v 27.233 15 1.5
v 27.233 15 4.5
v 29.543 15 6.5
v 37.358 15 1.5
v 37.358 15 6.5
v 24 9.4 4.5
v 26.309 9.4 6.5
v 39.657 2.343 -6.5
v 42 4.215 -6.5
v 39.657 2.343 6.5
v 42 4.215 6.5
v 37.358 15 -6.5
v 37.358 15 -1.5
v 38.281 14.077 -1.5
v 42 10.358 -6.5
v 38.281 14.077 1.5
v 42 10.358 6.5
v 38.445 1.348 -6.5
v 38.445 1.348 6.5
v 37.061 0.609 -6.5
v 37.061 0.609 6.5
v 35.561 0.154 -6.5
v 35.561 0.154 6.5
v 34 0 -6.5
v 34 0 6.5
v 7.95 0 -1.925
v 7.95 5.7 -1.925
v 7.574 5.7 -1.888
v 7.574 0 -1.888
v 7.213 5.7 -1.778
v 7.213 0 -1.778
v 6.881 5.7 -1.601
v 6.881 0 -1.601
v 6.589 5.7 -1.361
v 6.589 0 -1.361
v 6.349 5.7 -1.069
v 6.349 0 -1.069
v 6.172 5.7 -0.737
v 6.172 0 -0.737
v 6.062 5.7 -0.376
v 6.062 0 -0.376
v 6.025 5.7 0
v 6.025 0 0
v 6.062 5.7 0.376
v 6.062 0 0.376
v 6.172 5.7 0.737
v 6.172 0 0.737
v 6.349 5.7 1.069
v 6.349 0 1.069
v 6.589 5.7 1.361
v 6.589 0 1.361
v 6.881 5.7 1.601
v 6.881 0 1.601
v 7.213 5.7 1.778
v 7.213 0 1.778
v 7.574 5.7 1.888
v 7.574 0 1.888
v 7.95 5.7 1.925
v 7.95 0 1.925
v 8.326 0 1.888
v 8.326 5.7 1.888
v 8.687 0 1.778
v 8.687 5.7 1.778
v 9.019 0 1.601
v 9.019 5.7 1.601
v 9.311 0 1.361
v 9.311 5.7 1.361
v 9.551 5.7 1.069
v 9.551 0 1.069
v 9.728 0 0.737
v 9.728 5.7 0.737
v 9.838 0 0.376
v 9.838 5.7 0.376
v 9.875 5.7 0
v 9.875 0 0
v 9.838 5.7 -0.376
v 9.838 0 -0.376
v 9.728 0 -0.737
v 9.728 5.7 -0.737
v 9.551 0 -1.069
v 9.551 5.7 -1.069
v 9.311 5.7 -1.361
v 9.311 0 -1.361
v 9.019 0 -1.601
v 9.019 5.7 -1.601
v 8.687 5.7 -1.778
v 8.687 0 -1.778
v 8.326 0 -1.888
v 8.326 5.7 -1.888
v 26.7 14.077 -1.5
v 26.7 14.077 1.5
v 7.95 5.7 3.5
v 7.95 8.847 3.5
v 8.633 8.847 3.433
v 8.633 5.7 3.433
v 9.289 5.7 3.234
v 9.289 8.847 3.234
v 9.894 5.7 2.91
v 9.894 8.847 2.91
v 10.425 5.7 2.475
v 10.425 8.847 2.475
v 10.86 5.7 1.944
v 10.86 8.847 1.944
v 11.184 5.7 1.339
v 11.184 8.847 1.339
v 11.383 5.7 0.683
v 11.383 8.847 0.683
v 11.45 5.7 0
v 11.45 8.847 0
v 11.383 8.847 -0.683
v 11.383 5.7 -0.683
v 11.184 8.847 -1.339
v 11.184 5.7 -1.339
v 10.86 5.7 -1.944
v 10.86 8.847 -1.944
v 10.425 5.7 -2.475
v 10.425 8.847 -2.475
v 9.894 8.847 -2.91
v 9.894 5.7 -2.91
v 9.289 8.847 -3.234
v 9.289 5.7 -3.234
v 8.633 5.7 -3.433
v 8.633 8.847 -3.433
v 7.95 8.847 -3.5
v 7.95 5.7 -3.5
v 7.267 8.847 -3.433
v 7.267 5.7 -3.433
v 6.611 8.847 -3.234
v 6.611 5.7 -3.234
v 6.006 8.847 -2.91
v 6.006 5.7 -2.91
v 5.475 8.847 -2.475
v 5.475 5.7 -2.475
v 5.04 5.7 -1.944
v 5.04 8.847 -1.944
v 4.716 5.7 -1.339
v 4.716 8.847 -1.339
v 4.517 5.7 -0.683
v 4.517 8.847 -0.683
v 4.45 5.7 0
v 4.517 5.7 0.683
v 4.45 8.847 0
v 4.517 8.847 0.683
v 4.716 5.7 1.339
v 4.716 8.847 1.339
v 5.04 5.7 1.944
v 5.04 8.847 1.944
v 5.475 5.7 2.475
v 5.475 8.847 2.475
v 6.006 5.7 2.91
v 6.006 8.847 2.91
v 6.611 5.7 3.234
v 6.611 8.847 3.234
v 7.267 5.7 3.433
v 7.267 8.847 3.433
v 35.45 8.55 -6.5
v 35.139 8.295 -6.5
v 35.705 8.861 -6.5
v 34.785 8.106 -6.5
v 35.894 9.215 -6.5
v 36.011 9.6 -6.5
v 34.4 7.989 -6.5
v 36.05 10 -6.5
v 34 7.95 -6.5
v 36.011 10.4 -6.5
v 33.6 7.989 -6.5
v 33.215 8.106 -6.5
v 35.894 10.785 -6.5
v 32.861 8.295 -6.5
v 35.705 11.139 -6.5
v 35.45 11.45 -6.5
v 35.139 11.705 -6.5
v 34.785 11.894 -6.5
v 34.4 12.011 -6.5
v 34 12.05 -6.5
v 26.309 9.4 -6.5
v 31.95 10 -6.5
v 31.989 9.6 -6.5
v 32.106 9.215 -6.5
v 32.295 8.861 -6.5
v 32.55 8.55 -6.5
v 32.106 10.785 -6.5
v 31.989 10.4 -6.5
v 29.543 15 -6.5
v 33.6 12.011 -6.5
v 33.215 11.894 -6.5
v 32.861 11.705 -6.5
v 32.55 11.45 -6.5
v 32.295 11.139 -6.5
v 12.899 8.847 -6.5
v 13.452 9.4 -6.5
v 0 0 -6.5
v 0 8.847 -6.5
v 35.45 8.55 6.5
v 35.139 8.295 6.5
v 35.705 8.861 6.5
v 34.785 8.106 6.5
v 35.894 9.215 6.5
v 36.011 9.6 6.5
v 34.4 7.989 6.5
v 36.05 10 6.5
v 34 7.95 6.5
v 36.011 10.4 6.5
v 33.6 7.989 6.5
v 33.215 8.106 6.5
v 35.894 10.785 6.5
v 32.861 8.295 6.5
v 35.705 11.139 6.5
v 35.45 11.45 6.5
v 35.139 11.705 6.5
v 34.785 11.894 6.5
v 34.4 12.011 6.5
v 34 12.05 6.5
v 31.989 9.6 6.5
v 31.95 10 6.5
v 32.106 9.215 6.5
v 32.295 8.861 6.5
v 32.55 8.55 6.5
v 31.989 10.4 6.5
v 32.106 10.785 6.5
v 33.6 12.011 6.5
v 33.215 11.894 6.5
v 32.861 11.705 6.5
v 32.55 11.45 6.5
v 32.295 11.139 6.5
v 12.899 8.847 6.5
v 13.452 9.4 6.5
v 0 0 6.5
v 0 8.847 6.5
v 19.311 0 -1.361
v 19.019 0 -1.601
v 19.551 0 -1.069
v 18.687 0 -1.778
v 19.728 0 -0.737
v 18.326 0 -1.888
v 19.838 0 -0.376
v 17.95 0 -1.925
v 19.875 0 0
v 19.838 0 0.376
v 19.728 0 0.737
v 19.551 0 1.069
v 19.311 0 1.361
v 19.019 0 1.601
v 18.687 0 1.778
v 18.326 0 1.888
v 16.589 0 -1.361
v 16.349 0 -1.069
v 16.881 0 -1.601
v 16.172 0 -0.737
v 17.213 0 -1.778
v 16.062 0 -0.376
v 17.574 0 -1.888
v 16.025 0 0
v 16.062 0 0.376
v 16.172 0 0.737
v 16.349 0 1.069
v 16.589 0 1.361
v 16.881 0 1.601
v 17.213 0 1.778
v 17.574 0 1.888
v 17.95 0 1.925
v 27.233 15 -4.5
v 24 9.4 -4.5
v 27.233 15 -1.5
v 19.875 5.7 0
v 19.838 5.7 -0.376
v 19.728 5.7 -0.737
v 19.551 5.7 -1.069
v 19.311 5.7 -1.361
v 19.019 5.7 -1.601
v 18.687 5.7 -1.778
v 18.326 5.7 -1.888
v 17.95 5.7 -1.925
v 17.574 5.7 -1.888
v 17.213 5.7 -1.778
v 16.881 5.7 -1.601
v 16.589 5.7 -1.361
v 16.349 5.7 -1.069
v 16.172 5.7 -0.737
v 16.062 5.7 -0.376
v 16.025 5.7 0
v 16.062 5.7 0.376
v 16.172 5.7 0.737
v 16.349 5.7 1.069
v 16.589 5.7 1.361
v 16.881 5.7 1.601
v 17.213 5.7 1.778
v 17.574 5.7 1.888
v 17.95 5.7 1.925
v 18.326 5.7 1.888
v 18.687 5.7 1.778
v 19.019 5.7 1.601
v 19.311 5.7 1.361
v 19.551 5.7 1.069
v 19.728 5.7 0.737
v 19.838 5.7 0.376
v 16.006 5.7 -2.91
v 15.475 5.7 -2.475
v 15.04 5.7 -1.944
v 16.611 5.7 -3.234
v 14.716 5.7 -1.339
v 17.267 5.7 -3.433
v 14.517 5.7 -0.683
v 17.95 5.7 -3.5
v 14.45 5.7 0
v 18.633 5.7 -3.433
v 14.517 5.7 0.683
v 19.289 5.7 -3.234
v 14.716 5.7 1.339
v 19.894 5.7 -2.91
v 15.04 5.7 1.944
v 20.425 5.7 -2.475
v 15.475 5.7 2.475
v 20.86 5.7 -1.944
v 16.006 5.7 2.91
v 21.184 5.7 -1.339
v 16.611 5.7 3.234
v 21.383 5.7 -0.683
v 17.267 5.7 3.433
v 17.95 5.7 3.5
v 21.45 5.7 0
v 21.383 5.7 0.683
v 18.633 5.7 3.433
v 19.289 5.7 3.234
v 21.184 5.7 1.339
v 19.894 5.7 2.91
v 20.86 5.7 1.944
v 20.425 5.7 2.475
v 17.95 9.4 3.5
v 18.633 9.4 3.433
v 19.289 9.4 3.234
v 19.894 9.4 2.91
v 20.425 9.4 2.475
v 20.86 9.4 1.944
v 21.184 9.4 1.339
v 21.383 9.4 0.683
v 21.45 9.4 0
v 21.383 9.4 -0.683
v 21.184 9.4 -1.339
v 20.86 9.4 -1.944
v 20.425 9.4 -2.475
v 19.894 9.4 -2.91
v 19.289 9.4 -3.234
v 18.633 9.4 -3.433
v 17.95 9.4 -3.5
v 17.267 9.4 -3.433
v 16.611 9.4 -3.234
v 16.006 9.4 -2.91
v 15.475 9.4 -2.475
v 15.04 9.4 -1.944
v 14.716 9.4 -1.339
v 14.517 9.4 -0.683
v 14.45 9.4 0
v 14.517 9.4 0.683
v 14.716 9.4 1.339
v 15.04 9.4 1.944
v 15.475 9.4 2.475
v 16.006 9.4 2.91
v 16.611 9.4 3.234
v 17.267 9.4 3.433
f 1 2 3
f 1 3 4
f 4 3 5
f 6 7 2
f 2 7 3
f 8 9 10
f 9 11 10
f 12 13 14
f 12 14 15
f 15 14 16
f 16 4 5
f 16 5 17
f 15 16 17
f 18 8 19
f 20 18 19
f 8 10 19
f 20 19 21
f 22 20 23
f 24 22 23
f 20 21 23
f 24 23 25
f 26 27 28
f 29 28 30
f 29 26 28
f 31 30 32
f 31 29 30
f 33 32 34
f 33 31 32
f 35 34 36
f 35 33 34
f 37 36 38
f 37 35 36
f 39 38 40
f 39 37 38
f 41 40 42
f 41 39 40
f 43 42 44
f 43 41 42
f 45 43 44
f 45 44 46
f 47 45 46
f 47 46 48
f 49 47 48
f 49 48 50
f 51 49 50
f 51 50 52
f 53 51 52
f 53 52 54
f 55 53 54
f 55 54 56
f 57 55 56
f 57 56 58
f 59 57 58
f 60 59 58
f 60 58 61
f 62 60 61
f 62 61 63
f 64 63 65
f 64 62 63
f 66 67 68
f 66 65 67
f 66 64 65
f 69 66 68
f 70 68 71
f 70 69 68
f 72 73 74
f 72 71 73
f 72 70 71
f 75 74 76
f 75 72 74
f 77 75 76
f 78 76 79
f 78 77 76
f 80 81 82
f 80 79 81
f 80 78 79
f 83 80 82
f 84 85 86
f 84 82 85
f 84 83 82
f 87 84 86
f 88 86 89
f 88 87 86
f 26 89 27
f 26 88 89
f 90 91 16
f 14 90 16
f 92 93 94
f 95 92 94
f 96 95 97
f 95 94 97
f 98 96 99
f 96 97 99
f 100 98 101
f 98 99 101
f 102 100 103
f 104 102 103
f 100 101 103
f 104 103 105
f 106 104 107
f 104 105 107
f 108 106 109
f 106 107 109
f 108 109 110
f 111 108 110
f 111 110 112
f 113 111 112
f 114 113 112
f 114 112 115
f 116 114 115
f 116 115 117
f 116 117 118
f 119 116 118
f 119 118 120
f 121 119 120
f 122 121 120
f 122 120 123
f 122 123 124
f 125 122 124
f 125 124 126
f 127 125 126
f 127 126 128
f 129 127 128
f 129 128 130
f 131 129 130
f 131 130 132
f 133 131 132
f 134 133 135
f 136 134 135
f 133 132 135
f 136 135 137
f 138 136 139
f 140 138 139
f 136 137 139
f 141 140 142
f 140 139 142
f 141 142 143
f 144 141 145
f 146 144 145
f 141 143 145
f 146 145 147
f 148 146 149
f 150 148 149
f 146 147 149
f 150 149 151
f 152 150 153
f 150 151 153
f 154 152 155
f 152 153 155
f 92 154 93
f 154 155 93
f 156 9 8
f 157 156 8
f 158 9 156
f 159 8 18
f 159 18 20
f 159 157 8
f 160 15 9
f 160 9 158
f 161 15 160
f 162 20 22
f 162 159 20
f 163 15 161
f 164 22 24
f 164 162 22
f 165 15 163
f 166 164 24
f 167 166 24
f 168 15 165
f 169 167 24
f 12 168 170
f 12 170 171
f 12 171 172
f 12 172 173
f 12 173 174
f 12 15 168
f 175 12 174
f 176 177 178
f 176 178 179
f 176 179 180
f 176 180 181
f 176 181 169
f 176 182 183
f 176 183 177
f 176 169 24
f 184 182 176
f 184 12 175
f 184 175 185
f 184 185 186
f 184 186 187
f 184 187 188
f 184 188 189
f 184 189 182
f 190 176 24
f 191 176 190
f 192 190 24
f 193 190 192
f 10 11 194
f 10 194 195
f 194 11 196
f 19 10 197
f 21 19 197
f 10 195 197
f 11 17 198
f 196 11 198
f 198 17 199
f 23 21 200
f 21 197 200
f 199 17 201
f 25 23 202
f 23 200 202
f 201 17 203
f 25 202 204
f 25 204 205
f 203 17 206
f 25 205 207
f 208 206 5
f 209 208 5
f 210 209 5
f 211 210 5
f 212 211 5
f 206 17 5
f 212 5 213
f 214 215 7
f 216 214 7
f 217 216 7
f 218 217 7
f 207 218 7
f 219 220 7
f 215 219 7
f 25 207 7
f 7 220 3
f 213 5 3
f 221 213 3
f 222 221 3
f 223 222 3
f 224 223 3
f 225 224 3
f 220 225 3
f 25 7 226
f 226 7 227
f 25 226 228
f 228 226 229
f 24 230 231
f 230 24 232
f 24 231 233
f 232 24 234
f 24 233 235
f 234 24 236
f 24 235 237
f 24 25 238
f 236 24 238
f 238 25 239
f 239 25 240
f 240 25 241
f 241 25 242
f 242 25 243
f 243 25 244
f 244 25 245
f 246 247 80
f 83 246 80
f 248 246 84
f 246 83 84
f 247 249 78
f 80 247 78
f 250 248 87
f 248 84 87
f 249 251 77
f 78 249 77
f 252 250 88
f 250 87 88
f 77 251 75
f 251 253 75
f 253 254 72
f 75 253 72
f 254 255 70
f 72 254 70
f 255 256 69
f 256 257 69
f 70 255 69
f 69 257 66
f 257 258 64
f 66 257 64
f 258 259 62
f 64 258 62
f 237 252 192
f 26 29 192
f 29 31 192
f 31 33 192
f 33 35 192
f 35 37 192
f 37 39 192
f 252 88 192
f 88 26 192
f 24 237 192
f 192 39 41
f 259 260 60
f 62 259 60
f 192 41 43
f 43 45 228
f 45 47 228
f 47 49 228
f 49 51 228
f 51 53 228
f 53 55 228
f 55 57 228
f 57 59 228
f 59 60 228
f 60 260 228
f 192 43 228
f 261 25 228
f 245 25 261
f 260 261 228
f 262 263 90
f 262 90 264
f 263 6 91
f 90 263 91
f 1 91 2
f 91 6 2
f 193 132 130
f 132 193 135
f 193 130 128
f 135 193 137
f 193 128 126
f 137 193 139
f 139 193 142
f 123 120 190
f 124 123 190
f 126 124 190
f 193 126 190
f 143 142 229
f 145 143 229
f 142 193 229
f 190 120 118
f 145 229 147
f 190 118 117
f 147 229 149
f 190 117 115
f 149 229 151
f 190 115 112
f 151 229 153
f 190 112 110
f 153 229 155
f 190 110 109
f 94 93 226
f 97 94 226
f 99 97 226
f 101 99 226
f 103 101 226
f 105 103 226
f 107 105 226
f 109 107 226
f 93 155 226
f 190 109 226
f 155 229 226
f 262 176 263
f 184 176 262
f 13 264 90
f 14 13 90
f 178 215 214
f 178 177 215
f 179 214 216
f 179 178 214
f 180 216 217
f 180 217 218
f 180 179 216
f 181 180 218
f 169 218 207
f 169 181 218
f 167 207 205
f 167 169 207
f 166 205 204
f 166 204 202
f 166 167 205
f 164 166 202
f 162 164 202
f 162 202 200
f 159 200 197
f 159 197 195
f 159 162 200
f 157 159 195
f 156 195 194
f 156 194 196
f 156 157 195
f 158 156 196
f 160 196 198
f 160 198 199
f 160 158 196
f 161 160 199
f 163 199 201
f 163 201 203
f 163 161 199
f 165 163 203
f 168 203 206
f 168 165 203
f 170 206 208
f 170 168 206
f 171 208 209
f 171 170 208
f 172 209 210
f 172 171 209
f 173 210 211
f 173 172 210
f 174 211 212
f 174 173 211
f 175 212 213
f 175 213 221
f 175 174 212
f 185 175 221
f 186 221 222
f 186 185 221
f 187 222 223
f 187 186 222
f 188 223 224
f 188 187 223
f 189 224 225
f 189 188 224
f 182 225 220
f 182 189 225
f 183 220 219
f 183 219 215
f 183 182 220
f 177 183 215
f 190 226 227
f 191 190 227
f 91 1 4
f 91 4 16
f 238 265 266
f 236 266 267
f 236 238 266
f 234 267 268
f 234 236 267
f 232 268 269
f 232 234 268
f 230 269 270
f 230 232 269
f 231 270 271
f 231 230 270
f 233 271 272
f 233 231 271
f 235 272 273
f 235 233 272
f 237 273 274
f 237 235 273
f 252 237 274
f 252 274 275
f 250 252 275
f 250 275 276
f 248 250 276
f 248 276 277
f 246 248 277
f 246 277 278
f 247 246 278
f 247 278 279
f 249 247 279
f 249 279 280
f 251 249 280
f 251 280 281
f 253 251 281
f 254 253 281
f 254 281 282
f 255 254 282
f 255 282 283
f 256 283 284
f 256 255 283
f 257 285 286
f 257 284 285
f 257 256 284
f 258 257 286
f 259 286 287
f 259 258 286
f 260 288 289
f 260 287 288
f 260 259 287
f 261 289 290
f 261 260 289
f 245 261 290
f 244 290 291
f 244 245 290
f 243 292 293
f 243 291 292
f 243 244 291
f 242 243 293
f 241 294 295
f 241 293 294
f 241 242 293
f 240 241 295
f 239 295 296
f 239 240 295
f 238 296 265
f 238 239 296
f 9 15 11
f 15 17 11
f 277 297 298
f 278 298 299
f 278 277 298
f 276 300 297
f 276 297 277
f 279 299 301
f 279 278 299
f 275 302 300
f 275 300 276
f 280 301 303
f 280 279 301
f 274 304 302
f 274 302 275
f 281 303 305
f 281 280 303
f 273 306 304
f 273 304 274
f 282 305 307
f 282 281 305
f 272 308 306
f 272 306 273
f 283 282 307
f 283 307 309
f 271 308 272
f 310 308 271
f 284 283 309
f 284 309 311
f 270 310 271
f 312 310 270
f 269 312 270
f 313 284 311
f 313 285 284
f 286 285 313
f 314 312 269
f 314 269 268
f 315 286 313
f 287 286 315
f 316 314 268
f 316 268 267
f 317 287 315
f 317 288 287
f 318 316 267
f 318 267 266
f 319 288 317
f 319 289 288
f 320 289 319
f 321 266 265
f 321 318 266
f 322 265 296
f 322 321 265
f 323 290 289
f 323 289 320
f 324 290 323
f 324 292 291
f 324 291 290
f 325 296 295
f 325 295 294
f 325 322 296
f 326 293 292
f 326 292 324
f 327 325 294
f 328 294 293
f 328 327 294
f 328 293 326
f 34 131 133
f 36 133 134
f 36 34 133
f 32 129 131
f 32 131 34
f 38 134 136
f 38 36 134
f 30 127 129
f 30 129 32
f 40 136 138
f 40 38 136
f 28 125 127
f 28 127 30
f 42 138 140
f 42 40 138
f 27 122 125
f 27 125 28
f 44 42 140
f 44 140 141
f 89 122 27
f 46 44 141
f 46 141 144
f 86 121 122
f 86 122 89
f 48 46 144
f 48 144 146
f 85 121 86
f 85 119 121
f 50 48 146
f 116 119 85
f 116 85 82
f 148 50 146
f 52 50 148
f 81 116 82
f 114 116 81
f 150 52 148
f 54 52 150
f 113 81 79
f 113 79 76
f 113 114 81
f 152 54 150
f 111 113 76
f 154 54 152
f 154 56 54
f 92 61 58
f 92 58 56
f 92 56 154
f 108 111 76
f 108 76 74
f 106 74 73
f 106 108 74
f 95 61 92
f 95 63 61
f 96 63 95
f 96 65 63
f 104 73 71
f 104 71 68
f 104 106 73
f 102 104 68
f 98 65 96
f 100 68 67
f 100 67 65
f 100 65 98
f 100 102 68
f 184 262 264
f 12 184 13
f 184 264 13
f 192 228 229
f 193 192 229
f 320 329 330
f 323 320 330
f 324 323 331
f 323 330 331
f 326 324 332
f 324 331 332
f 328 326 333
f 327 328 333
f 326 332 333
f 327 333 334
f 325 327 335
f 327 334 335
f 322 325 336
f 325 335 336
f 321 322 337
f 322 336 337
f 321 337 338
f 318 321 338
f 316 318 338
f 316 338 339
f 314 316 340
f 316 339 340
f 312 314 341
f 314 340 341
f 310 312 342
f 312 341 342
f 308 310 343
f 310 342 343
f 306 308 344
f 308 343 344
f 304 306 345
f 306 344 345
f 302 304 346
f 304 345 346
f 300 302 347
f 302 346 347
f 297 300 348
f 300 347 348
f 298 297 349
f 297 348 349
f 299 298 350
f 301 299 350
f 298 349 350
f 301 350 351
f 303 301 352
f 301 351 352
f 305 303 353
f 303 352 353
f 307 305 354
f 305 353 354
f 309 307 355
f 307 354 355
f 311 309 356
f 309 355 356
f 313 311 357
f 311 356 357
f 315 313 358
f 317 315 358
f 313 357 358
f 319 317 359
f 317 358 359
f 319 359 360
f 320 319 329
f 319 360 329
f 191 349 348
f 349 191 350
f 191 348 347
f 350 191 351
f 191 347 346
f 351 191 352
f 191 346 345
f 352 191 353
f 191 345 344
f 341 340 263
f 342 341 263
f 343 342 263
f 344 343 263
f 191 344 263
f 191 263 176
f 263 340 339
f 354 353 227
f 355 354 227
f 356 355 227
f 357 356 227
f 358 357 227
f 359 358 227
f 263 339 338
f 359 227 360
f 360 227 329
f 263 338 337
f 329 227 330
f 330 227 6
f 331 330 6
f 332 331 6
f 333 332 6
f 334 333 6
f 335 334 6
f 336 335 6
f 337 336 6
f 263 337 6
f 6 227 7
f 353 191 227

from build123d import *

# Parameters (mm, degrees)
SKETCH_1_R          = 2.05
EXTRUDE_1_DEPTH     = 6.5
SKETCH_2_R          = 1.925
CUT_EXTRUDE_1_DEPTH = 46.069390943
SKETCH_4_R          = 3.5
CUT_EXTRUDE_3_DEPTH = 3.7
SKETCH_5_W          = 18.309146901
SKETCH_5_H          = 4.198551417
CUT_EXTRUDE_4_DEPTH = 1.5
CHAMFER_1_SIZE      = 2


with BuildPart() as part:
    # 스케치1 → 보스-돌출1 (new, symmetric)
    with BuildSketch(Plane.XY):
        with BuildLine():
            Line((24, 9.4), (27.233161507, 15))
            Line((27.233161507, 15), (37.358175691, 15))
            Line((37.358175691, 15), (42, 10.358175691))
            Line((42, 10.358175691), (42, 8))
            Line((42, 8), (42, 4.214621821))
            Line((42, 4.214621821), (39.656854249, 2.343145751))
            ThreePointArc((39.656854249, 2.343145751), (37.061467459, 0.60896374), (34, 0))
            Line((34, 0), (0, 0))
            Line((0, 0), (0, 8.847038924))
            Line((0, 8.847038924), (12.898784487, 8.847038924))
            Line((12.898784487, 8.847038924), (13.451745563, 9.4))
            Line((13.451745563, 9.4), (24, 9.4))
        make_face()
        with Locations(Location((34, 10, 0), (0, 0, 180))):
            Circle(SKETCH_1_R, mode=Mode.SUBTRACT)
    extrude(amount=EXTRUDE_1_DEPTH, both=True)

    # 스케치2 → 컷-돌출1 (cut, through all)
    with BuildSketch(Plane(origin=(0, 0, 0), x_dir=(1, 0, 0), z_dir=(0, 1, 0))):
        with Locations(Location((7.95, 0, 0), (0, 0, 90))):
            Circle(SKETCH_2_R)
        with Locations((17.95, 0)):
            Circle(SKETCH_2_R)
    extrude(amount=CUT_EXTRUDE_1_DEPTH, mode=Mode.SUBTRACT)

    # 스케치4 → 컷-돌출3 (cut)
    with BuildSketch(Plane(origin=(0, 9.4, 0), x_dir=(1, 0, 0), z_dir=(0, 1, 0))):
        with Locations(Location((7.95, 0, 0), (0, 0, 270))):
            Circle(SKETCH_4_R)
        with Locations(Location((17.95, 0, 0), (0, 0, 270))):
            Circle(SKETCH_4_R)
    extrude(amount=-CUT_EXTRUDE_3_DEPTH, mode=Mode.SUBTRACT)

    # 스케치5 → 컷-돌출4 (cut, symmetric)
    with BuildSketch(Plane.XY):
        with Locations((31.708331529, 16.176346462)):
            Rectangle(SKETCH_5_W, SKETCH_5_H)
    extrude(amount=CUT_EXTRUDE_4_DEPTH, both=True, mode=Mode.SUBTRACT)

    # 모따기1
    chamfer_1_edges = [part.edges().sort_by_distance(p)[0] for p in [
        (25.616580754, 12.2, -6.5),
        (25.616580754, 12.2, 6.5),
    ]]
    chamfer(chamfer_1_edges, length=CHAMFER_1_SIZE)


solid = part.part
